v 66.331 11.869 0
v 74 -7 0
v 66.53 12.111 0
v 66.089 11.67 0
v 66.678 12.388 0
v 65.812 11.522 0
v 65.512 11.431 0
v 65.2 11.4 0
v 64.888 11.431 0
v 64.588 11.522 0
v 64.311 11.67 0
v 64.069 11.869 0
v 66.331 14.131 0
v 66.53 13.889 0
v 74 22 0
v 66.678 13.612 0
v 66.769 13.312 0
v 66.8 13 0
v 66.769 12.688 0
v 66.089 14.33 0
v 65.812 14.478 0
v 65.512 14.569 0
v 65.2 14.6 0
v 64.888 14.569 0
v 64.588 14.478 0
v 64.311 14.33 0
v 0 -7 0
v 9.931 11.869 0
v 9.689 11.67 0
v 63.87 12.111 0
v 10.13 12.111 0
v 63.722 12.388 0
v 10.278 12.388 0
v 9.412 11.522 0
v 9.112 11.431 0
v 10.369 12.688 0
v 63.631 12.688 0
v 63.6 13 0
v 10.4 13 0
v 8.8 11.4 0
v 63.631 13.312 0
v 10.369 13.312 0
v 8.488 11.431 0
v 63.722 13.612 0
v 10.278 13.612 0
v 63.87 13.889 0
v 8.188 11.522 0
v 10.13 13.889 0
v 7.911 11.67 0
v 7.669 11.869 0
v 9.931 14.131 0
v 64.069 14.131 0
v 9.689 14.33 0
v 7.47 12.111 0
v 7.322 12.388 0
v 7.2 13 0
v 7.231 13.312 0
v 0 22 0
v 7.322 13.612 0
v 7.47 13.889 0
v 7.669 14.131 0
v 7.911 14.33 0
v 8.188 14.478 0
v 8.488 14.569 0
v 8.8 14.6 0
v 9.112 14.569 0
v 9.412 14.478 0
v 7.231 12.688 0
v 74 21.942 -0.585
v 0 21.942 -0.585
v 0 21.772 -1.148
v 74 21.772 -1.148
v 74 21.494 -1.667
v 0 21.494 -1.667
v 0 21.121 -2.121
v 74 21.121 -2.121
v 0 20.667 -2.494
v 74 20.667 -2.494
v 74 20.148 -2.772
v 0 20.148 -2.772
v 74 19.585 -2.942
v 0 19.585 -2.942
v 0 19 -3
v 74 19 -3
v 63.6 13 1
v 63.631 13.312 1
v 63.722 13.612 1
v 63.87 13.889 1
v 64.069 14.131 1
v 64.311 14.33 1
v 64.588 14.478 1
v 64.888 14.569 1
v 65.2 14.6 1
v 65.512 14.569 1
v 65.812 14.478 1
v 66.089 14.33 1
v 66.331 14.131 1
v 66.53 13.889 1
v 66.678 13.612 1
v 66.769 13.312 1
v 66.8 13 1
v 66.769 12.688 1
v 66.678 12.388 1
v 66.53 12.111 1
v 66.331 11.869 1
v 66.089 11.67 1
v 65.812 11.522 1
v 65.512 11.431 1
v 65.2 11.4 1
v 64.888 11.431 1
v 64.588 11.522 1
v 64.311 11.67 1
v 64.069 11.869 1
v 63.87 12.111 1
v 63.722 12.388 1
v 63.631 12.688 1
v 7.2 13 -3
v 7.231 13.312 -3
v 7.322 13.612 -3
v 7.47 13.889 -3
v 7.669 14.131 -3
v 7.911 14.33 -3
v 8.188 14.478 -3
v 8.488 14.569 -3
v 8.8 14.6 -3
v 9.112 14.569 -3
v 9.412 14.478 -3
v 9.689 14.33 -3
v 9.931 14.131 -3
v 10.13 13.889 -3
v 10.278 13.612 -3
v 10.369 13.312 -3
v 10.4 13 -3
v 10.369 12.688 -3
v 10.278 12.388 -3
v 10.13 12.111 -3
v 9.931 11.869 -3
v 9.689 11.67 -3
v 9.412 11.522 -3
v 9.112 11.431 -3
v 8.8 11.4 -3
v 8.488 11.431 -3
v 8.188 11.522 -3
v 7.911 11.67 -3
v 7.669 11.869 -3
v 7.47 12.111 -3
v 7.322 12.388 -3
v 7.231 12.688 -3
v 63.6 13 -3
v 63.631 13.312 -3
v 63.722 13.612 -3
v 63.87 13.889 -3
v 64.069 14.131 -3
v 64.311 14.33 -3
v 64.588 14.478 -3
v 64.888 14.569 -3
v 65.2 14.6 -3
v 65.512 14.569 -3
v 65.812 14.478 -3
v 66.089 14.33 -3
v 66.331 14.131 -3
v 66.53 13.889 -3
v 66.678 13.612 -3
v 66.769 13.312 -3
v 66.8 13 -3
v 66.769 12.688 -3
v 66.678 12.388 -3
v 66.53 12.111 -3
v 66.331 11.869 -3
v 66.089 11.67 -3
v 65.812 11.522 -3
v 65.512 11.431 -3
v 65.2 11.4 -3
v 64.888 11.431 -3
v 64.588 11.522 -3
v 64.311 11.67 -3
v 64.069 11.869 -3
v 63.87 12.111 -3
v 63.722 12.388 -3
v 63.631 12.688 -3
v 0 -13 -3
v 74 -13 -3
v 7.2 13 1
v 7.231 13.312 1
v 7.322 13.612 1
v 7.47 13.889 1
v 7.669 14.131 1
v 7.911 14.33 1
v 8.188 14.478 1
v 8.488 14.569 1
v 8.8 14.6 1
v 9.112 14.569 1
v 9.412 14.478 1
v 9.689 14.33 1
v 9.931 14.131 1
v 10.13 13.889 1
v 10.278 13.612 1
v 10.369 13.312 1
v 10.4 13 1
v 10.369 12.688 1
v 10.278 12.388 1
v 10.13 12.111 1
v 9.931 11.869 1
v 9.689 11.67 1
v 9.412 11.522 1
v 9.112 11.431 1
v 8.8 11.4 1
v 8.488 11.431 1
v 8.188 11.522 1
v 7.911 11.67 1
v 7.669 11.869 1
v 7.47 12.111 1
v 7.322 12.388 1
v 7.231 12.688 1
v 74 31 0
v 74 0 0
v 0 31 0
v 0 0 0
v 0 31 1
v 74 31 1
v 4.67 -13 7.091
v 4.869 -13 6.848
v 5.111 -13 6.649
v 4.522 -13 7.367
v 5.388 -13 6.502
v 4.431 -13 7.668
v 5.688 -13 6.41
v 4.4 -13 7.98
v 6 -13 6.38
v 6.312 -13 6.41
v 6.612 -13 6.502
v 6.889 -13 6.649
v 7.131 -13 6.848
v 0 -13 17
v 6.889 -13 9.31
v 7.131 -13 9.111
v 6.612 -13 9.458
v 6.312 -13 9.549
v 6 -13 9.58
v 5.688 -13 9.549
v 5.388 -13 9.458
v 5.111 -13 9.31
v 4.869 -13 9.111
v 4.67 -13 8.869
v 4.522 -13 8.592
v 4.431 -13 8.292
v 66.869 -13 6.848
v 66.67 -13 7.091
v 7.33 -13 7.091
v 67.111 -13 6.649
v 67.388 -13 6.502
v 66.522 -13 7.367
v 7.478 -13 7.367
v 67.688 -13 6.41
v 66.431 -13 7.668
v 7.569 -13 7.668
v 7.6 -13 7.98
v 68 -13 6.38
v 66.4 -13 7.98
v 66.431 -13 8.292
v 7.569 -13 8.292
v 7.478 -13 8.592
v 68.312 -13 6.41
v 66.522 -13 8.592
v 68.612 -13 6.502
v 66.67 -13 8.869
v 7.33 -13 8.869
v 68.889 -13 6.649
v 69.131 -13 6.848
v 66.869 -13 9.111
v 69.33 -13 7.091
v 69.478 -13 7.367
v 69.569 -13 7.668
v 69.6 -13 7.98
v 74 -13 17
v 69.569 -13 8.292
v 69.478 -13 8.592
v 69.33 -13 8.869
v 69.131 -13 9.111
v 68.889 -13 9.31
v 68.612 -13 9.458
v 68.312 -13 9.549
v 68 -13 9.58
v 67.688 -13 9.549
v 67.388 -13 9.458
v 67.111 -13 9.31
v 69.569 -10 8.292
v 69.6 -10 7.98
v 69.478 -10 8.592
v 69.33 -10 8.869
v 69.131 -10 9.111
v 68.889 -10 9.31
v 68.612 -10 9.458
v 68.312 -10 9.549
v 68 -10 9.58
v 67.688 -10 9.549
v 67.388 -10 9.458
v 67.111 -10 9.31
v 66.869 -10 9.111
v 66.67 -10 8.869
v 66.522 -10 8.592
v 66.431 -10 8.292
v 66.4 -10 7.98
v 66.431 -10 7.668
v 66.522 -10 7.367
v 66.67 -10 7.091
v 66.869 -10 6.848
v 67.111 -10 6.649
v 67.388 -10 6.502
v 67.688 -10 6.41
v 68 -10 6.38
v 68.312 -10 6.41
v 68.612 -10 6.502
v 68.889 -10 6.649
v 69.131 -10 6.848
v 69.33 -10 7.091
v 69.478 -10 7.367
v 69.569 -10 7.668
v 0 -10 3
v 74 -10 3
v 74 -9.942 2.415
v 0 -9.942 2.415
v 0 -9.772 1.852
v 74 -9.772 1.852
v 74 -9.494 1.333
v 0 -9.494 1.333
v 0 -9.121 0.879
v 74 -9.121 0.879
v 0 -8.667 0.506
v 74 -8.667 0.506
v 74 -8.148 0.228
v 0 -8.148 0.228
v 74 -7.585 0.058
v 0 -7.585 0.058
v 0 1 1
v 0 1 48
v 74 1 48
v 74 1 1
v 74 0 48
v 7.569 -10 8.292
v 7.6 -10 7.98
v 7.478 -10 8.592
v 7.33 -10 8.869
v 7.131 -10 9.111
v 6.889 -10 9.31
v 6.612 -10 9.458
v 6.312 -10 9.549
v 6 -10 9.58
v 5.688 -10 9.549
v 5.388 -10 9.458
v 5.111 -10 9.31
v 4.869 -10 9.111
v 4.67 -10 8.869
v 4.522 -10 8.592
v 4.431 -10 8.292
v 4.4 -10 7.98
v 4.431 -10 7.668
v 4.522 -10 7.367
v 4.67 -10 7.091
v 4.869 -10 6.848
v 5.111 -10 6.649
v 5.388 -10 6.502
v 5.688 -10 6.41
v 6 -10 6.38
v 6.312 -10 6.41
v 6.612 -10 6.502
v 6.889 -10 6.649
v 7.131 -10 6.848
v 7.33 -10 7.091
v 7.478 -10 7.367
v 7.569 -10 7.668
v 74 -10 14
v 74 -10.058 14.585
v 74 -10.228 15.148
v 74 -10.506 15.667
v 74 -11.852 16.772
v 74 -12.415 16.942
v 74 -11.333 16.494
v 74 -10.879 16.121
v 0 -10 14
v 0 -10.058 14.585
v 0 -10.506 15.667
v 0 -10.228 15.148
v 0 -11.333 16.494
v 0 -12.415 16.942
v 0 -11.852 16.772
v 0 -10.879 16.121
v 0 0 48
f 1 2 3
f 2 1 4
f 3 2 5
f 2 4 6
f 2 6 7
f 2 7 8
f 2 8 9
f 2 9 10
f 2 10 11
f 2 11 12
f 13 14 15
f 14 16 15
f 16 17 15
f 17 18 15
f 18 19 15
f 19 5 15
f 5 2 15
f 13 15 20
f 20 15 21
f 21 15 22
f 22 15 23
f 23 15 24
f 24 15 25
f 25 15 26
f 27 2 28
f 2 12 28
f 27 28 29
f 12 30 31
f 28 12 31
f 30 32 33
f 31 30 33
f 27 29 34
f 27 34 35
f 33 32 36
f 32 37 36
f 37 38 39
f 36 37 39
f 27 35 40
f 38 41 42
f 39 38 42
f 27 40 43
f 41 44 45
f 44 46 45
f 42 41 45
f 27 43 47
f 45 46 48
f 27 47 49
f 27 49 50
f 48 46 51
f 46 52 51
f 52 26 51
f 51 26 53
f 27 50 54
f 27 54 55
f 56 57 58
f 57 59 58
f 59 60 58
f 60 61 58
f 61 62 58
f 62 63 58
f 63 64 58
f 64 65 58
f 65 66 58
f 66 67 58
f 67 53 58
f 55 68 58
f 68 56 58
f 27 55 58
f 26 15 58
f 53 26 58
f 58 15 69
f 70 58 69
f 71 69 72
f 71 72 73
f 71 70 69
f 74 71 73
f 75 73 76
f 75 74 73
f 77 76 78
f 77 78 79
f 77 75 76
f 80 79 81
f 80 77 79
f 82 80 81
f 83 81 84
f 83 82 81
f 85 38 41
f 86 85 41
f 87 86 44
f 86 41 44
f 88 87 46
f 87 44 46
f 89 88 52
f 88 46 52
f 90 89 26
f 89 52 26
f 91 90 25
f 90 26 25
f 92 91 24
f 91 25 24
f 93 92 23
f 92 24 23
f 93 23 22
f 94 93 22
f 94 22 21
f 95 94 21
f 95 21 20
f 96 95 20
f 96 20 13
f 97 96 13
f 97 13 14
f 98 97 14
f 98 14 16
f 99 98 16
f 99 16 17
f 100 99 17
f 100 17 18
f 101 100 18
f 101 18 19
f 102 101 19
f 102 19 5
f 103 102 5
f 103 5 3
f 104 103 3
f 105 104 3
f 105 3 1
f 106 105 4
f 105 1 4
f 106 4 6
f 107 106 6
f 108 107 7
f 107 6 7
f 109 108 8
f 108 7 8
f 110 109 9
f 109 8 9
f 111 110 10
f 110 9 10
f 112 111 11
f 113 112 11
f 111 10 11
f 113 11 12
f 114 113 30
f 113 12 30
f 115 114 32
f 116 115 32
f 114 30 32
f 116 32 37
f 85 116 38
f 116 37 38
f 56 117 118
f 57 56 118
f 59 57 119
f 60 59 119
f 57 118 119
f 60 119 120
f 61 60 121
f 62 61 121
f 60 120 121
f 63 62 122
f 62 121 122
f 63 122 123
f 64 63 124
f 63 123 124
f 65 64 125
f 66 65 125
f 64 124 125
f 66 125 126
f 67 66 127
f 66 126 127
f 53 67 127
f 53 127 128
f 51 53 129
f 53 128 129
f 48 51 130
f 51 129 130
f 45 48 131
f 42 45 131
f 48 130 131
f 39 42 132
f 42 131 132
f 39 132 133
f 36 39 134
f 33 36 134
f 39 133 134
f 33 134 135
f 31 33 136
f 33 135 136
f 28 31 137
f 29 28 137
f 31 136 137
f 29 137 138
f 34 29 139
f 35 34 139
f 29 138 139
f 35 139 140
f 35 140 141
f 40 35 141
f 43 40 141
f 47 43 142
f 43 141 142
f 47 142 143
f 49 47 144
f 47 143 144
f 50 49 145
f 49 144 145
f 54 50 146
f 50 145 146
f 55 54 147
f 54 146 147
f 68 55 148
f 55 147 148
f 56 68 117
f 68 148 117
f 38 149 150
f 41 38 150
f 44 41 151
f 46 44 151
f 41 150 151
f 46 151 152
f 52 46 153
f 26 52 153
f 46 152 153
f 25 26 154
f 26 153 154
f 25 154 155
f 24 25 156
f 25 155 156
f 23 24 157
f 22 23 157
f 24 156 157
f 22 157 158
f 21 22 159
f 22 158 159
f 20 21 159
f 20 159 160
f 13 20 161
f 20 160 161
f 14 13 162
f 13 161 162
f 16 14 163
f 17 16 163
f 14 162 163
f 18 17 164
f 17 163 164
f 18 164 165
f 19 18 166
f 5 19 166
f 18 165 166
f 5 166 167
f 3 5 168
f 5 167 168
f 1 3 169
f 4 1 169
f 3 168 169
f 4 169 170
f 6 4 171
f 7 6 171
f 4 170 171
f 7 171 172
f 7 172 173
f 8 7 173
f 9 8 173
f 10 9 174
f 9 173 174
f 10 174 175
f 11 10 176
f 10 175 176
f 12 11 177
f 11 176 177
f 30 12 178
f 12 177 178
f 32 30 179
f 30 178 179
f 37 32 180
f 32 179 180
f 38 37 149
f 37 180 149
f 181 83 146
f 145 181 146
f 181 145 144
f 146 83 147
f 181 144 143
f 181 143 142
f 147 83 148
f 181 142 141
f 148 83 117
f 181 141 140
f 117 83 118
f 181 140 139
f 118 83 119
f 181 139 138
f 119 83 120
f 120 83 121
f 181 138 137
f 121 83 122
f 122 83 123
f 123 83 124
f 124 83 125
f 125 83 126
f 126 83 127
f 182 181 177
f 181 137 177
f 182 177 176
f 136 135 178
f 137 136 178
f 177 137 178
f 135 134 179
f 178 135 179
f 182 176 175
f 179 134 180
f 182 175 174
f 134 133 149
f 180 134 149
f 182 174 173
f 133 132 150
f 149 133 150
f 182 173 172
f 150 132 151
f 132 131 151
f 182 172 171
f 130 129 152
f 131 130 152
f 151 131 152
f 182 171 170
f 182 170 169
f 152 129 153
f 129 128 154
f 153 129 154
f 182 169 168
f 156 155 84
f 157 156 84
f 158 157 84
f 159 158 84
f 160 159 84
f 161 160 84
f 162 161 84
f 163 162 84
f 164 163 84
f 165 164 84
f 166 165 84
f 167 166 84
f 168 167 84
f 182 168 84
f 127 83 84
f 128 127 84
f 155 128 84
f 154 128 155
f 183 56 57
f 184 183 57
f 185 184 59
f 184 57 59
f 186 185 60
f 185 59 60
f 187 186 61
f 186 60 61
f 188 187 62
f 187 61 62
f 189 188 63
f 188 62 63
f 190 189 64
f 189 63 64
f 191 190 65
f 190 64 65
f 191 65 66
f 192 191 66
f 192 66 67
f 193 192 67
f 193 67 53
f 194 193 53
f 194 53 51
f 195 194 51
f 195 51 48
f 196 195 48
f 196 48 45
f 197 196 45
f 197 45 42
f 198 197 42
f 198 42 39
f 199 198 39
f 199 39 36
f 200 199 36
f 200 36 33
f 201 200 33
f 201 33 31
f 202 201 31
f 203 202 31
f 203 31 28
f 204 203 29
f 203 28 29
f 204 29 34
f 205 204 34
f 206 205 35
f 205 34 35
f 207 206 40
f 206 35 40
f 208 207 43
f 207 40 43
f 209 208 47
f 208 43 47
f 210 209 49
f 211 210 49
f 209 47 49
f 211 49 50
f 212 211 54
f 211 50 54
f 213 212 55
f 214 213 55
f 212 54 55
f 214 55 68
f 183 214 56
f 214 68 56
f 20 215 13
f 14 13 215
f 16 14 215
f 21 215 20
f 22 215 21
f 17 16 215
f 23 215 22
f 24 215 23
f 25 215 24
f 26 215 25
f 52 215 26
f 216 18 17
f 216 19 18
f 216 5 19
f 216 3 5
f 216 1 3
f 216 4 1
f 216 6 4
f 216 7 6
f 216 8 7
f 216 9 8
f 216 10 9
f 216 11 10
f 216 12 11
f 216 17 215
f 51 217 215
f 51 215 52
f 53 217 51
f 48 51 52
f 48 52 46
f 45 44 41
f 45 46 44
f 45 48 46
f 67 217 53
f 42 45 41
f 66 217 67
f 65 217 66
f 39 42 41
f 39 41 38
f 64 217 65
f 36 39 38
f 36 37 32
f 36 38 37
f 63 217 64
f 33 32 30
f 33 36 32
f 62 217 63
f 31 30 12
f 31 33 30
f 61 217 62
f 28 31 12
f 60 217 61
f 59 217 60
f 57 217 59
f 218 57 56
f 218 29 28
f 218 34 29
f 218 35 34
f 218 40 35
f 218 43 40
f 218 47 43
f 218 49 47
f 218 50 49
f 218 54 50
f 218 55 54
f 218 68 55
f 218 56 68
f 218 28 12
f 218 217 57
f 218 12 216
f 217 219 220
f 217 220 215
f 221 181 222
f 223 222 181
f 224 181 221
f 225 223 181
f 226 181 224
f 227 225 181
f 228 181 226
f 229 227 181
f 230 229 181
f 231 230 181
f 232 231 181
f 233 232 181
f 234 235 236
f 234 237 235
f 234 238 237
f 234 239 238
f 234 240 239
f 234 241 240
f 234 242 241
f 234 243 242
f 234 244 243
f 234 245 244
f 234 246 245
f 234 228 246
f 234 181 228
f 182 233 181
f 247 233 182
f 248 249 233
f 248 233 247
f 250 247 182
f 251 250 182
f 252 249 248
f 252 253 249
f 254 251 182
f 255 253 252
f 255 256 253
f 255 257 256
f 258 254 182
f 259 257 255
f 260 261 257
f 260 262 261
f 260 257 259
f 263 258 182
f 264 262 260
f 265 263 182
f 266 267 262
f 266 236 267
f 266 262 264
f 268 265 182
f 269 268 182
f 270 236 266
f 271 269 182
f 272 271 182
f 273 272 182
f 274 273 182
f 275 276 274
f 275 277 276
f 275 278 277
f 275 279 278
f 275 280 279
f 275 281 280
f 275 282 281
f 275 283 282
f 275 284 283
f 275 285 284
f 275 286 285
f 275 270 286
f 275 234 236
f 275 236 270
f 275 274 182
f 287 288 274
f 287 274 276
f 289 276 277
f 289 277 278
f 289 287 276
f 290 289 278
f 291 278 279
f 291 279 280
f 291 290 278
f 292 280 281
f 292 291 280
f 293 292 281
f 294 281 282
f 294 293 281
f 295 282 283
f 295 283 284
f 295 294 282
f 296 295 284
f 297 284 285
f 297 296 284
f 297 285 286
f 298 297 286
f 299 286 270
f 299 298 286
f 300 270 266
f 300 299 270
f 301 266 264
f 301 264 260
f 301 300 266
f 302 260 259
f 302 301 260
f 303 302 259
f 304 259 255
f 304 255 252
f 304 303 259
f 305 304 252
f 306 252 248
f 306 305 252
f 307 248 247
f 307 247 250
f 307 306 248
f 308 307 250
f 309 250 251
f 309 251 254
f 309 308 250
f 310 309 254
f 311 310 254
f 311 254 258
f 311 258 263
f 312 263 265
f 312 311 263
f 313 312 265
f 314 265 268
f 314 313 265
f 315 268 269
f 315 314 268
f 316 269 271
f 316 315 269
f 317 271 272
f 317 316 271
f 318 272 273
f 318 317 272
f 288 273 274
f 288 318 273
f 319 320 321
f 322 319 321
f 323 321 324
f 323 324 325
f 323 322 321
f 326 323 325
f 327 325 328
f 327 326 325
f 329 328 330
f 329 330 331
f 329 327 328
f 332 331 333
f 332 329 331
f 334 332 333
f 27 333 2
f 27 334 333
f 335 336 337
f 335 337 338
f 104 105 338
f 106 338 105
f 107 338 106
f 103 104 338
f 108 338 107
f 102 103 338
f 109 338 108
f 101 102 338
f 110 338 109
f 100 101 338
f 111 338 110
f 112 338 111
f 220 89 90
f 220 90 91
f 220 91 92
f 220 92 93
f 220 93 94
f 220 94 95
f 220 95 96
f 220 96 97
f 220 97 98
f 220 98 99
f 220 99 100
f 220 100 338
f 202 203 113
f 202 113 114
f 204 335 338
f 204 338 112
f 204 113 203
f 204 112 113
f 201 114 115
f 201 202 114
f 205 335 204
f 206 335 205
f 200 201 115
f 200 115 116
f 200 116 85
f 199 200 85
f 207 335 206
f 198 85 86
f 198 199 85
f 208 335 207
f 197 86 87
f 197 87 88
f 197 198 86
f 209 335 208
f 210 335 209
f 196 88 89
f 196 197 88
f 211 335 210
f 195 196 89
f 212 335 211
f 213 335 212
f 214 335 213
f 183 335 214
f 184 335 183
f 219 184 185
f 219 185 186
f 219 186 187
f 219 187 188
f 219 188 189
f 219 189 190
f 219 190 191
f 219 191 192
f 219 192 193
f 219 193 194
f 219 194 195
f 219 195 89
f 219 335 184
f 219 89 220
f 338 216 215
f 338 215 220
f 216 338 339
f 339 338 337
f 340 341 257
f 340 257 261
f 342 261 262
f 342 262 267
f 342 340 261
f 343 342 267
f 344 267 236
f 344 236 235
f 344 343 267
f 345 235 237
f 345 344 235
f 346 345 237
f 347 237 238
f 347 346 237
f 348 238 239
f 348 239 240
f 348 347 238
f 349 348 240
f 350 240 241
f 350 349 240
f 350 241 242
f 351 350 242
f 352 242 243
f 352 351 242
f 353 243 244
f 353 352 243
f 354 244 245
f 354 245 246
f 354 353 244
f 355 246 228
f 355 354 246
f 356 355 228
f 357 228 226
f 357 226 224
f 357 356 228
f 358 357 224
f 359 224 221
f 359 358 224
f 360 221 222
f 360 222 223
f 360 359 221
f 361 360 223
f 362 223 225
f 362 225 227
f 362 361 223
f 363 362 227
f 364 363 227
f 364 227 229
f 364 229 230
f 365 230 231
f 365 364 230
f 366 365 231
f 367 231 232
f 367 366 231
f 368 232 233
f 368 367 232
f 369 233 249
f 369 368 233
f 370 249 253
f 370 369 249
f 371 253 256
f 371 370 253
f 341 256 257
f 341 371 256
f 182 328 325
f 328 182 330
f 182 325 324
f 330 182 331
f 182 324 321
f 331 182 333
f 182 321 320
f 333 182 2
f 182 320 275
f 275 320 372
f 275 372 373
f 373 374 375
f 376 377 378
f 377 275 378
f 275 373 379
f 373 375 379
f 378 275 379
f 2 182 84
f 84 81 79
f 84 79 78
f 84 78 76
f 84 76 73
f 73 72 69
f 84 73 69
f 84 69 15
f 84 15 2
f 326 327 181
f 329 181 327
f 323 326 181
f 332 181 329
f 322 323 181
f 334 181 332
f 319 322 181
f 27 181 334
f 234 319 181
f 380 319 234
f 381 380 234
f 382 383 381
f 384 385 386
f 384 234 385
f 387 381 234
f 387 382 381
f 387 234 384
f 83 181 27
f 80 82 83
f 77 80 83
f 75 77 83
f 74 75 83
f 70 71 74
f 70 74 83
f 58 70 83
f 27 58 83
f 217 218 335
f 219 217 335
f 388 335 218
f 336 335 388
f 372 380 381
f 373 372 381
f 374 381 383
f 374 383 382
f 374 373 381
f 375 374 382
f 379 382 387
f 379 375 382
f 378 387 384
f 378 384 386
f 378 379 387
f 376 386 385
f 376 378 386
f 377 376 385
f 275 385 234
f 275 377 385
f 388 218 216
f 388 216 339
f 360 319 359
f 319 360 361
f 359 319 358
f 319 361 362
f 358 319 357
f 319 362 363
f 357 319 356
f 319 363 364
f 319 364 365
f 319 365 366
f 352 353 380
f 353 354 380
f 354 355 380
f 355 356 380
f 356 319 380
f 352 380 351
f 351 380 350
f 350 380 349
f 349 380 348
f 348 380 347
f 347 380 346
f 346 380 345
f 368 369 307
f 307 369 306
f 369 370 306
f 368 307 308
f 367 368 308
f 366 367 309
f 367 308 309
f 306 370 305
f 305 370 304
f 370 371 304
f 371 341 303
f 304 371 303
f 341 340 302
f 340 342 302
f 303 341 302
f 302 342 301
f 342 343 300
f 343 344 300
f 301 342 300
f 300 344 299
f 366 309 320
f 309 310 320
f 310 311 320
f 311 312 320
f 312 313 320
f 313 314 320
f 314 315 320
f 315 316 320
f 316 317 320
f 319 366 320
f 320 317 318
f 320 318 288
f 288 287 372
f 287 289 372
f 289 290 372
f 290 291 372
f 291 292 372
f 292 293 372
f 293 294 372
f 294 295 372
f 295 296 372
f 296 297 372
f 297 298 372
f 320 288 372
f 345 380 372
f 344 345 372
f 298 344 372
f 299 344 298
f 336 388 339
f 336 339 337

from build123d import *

# Parameters (mm, degrees)
EXTRUDE_1_DEPTH     = 74
SKETCH_2_R          = 1.6
CUT_EXTRUDE_1_DEPTH = 13
SKETCH2_W           = 74
SKETCH2_H           = 32
BOSS_EXTRUDE1_DEPTH = 3
SKETCH3_W           = 74
SKETCH3_H           = 20
SKETCH3_R           = 1.6
BOSS_EXTRUDE2_DEPTH = 3
SKETCH5_R           = 1.6
CUT_EXTRUDE1_DEPTH  = 3
FILLET3_R           = 3
FILLET5_R           = 3
FILLET6_R           = 3


with BuildPart() as part:
    # Эскиз1 → Бобышка-Вытянуть1 (new body)
    with BuildSketch(Plane(origin=(0, 0, 0), x_dir=(0, 0, -1), z_dir=(1, 0, 0))):
        Polygon((0, 0), (-48, 0), (-48, 1), (-1, 1), (-1, 31), (0, 31), align=None)
    extrude(amount=EXTRUDE_1_DEPTH)

    # Эскиз2 → Вырез-Вытянуть1 (cut)
    with BuildSketch(Plane(origin=(0, 0, 0), x_dir=(-1, 0, 0), z_dir=(0, 0, -1))):
        with Locations((-65.2, 13)):
            Circle(SKETCH_2_R)
        with Locations((-8.8, 13)):
            Circle(SKETCH_2_R)
    extrude(amount=-CUT_EXTRUDE_1_DEPTH, mode=Mode.SUBTRACT)


with BuildPart() as body_2:
    # Sketch2 → Boss-Extrude1 (new body)
    with BuildSketch(Plane(origin=(0, 0, 0), x_dir=(-1, 0, 0), z_dir=(0, 0, -1))):
        with Locations((-37, 6)):
            Rectangle(SKETCH2_W, SKETCH2_H)
    extrude(amount=BOSS_EXTRUDE1_DEPTH)

    # Sketch3 → Boss-Extrude2 (add)
    with BuildSketch(Plane.XZ.offset(10)):
        with Locations((37, 7)):
            Rectangle(SKETCH3_W, SKETCH3_H)
        with Locations((6, 7.979709157)):
            Circle(SKETCH3_R, mode=Mode.SUBTRACT)
        with Locations((68, 7.979709157)):
            Circle(SKETCH3_R, mode=Mode.SUBTRACT)
    extrude(amount=BOSS_EXTRUDE2_DEPTH)

    # Sketch5 → Cut-Extrude1 (cut)
    with BuildSketch(Plane(origin=(0, 0, -3), x_dir=(-1, 0, 0), z_dir=(0, 0, -1))):
        with Locations((-65.2, 13)):
            Circle(SKETCH5_R)
        with Locations((-8.8, 13)):
            Circle(SKETCH5_R)
    extrude(amount=-CUT_EXTRUDE1_DEPTH, mode=Mode.SUBTRACT)

    # Fillet3
    fillet3_edges = [body_2.edges().sort_by_distance(p)[0] for p in [
        (37, 22, -3),
    ]]
    fillet(fillet3_edges, radius=FILLET3_R - 0.0001)  # a hair under: the kernel refuses the full size

    # Fillet5
    fillet5_edges = [body_2.edges().sort_by_distance(p)[0] for p in [
        (37, -10, 17),
    ]]
    fillet(fillet5_edges, radius=FILLET5_R - 0.0001)  # a hair under: the kernel refuses the full size

    # Fillet6
    fillet6_edges = [body_2.edges().sort_by_distance(p)[0] for p in [
        (37, -10, 0),
    ]]
    fillet(fillet6_edges, radius=FILLET6_R)


solid = Compound([part.part, body_2.part])
